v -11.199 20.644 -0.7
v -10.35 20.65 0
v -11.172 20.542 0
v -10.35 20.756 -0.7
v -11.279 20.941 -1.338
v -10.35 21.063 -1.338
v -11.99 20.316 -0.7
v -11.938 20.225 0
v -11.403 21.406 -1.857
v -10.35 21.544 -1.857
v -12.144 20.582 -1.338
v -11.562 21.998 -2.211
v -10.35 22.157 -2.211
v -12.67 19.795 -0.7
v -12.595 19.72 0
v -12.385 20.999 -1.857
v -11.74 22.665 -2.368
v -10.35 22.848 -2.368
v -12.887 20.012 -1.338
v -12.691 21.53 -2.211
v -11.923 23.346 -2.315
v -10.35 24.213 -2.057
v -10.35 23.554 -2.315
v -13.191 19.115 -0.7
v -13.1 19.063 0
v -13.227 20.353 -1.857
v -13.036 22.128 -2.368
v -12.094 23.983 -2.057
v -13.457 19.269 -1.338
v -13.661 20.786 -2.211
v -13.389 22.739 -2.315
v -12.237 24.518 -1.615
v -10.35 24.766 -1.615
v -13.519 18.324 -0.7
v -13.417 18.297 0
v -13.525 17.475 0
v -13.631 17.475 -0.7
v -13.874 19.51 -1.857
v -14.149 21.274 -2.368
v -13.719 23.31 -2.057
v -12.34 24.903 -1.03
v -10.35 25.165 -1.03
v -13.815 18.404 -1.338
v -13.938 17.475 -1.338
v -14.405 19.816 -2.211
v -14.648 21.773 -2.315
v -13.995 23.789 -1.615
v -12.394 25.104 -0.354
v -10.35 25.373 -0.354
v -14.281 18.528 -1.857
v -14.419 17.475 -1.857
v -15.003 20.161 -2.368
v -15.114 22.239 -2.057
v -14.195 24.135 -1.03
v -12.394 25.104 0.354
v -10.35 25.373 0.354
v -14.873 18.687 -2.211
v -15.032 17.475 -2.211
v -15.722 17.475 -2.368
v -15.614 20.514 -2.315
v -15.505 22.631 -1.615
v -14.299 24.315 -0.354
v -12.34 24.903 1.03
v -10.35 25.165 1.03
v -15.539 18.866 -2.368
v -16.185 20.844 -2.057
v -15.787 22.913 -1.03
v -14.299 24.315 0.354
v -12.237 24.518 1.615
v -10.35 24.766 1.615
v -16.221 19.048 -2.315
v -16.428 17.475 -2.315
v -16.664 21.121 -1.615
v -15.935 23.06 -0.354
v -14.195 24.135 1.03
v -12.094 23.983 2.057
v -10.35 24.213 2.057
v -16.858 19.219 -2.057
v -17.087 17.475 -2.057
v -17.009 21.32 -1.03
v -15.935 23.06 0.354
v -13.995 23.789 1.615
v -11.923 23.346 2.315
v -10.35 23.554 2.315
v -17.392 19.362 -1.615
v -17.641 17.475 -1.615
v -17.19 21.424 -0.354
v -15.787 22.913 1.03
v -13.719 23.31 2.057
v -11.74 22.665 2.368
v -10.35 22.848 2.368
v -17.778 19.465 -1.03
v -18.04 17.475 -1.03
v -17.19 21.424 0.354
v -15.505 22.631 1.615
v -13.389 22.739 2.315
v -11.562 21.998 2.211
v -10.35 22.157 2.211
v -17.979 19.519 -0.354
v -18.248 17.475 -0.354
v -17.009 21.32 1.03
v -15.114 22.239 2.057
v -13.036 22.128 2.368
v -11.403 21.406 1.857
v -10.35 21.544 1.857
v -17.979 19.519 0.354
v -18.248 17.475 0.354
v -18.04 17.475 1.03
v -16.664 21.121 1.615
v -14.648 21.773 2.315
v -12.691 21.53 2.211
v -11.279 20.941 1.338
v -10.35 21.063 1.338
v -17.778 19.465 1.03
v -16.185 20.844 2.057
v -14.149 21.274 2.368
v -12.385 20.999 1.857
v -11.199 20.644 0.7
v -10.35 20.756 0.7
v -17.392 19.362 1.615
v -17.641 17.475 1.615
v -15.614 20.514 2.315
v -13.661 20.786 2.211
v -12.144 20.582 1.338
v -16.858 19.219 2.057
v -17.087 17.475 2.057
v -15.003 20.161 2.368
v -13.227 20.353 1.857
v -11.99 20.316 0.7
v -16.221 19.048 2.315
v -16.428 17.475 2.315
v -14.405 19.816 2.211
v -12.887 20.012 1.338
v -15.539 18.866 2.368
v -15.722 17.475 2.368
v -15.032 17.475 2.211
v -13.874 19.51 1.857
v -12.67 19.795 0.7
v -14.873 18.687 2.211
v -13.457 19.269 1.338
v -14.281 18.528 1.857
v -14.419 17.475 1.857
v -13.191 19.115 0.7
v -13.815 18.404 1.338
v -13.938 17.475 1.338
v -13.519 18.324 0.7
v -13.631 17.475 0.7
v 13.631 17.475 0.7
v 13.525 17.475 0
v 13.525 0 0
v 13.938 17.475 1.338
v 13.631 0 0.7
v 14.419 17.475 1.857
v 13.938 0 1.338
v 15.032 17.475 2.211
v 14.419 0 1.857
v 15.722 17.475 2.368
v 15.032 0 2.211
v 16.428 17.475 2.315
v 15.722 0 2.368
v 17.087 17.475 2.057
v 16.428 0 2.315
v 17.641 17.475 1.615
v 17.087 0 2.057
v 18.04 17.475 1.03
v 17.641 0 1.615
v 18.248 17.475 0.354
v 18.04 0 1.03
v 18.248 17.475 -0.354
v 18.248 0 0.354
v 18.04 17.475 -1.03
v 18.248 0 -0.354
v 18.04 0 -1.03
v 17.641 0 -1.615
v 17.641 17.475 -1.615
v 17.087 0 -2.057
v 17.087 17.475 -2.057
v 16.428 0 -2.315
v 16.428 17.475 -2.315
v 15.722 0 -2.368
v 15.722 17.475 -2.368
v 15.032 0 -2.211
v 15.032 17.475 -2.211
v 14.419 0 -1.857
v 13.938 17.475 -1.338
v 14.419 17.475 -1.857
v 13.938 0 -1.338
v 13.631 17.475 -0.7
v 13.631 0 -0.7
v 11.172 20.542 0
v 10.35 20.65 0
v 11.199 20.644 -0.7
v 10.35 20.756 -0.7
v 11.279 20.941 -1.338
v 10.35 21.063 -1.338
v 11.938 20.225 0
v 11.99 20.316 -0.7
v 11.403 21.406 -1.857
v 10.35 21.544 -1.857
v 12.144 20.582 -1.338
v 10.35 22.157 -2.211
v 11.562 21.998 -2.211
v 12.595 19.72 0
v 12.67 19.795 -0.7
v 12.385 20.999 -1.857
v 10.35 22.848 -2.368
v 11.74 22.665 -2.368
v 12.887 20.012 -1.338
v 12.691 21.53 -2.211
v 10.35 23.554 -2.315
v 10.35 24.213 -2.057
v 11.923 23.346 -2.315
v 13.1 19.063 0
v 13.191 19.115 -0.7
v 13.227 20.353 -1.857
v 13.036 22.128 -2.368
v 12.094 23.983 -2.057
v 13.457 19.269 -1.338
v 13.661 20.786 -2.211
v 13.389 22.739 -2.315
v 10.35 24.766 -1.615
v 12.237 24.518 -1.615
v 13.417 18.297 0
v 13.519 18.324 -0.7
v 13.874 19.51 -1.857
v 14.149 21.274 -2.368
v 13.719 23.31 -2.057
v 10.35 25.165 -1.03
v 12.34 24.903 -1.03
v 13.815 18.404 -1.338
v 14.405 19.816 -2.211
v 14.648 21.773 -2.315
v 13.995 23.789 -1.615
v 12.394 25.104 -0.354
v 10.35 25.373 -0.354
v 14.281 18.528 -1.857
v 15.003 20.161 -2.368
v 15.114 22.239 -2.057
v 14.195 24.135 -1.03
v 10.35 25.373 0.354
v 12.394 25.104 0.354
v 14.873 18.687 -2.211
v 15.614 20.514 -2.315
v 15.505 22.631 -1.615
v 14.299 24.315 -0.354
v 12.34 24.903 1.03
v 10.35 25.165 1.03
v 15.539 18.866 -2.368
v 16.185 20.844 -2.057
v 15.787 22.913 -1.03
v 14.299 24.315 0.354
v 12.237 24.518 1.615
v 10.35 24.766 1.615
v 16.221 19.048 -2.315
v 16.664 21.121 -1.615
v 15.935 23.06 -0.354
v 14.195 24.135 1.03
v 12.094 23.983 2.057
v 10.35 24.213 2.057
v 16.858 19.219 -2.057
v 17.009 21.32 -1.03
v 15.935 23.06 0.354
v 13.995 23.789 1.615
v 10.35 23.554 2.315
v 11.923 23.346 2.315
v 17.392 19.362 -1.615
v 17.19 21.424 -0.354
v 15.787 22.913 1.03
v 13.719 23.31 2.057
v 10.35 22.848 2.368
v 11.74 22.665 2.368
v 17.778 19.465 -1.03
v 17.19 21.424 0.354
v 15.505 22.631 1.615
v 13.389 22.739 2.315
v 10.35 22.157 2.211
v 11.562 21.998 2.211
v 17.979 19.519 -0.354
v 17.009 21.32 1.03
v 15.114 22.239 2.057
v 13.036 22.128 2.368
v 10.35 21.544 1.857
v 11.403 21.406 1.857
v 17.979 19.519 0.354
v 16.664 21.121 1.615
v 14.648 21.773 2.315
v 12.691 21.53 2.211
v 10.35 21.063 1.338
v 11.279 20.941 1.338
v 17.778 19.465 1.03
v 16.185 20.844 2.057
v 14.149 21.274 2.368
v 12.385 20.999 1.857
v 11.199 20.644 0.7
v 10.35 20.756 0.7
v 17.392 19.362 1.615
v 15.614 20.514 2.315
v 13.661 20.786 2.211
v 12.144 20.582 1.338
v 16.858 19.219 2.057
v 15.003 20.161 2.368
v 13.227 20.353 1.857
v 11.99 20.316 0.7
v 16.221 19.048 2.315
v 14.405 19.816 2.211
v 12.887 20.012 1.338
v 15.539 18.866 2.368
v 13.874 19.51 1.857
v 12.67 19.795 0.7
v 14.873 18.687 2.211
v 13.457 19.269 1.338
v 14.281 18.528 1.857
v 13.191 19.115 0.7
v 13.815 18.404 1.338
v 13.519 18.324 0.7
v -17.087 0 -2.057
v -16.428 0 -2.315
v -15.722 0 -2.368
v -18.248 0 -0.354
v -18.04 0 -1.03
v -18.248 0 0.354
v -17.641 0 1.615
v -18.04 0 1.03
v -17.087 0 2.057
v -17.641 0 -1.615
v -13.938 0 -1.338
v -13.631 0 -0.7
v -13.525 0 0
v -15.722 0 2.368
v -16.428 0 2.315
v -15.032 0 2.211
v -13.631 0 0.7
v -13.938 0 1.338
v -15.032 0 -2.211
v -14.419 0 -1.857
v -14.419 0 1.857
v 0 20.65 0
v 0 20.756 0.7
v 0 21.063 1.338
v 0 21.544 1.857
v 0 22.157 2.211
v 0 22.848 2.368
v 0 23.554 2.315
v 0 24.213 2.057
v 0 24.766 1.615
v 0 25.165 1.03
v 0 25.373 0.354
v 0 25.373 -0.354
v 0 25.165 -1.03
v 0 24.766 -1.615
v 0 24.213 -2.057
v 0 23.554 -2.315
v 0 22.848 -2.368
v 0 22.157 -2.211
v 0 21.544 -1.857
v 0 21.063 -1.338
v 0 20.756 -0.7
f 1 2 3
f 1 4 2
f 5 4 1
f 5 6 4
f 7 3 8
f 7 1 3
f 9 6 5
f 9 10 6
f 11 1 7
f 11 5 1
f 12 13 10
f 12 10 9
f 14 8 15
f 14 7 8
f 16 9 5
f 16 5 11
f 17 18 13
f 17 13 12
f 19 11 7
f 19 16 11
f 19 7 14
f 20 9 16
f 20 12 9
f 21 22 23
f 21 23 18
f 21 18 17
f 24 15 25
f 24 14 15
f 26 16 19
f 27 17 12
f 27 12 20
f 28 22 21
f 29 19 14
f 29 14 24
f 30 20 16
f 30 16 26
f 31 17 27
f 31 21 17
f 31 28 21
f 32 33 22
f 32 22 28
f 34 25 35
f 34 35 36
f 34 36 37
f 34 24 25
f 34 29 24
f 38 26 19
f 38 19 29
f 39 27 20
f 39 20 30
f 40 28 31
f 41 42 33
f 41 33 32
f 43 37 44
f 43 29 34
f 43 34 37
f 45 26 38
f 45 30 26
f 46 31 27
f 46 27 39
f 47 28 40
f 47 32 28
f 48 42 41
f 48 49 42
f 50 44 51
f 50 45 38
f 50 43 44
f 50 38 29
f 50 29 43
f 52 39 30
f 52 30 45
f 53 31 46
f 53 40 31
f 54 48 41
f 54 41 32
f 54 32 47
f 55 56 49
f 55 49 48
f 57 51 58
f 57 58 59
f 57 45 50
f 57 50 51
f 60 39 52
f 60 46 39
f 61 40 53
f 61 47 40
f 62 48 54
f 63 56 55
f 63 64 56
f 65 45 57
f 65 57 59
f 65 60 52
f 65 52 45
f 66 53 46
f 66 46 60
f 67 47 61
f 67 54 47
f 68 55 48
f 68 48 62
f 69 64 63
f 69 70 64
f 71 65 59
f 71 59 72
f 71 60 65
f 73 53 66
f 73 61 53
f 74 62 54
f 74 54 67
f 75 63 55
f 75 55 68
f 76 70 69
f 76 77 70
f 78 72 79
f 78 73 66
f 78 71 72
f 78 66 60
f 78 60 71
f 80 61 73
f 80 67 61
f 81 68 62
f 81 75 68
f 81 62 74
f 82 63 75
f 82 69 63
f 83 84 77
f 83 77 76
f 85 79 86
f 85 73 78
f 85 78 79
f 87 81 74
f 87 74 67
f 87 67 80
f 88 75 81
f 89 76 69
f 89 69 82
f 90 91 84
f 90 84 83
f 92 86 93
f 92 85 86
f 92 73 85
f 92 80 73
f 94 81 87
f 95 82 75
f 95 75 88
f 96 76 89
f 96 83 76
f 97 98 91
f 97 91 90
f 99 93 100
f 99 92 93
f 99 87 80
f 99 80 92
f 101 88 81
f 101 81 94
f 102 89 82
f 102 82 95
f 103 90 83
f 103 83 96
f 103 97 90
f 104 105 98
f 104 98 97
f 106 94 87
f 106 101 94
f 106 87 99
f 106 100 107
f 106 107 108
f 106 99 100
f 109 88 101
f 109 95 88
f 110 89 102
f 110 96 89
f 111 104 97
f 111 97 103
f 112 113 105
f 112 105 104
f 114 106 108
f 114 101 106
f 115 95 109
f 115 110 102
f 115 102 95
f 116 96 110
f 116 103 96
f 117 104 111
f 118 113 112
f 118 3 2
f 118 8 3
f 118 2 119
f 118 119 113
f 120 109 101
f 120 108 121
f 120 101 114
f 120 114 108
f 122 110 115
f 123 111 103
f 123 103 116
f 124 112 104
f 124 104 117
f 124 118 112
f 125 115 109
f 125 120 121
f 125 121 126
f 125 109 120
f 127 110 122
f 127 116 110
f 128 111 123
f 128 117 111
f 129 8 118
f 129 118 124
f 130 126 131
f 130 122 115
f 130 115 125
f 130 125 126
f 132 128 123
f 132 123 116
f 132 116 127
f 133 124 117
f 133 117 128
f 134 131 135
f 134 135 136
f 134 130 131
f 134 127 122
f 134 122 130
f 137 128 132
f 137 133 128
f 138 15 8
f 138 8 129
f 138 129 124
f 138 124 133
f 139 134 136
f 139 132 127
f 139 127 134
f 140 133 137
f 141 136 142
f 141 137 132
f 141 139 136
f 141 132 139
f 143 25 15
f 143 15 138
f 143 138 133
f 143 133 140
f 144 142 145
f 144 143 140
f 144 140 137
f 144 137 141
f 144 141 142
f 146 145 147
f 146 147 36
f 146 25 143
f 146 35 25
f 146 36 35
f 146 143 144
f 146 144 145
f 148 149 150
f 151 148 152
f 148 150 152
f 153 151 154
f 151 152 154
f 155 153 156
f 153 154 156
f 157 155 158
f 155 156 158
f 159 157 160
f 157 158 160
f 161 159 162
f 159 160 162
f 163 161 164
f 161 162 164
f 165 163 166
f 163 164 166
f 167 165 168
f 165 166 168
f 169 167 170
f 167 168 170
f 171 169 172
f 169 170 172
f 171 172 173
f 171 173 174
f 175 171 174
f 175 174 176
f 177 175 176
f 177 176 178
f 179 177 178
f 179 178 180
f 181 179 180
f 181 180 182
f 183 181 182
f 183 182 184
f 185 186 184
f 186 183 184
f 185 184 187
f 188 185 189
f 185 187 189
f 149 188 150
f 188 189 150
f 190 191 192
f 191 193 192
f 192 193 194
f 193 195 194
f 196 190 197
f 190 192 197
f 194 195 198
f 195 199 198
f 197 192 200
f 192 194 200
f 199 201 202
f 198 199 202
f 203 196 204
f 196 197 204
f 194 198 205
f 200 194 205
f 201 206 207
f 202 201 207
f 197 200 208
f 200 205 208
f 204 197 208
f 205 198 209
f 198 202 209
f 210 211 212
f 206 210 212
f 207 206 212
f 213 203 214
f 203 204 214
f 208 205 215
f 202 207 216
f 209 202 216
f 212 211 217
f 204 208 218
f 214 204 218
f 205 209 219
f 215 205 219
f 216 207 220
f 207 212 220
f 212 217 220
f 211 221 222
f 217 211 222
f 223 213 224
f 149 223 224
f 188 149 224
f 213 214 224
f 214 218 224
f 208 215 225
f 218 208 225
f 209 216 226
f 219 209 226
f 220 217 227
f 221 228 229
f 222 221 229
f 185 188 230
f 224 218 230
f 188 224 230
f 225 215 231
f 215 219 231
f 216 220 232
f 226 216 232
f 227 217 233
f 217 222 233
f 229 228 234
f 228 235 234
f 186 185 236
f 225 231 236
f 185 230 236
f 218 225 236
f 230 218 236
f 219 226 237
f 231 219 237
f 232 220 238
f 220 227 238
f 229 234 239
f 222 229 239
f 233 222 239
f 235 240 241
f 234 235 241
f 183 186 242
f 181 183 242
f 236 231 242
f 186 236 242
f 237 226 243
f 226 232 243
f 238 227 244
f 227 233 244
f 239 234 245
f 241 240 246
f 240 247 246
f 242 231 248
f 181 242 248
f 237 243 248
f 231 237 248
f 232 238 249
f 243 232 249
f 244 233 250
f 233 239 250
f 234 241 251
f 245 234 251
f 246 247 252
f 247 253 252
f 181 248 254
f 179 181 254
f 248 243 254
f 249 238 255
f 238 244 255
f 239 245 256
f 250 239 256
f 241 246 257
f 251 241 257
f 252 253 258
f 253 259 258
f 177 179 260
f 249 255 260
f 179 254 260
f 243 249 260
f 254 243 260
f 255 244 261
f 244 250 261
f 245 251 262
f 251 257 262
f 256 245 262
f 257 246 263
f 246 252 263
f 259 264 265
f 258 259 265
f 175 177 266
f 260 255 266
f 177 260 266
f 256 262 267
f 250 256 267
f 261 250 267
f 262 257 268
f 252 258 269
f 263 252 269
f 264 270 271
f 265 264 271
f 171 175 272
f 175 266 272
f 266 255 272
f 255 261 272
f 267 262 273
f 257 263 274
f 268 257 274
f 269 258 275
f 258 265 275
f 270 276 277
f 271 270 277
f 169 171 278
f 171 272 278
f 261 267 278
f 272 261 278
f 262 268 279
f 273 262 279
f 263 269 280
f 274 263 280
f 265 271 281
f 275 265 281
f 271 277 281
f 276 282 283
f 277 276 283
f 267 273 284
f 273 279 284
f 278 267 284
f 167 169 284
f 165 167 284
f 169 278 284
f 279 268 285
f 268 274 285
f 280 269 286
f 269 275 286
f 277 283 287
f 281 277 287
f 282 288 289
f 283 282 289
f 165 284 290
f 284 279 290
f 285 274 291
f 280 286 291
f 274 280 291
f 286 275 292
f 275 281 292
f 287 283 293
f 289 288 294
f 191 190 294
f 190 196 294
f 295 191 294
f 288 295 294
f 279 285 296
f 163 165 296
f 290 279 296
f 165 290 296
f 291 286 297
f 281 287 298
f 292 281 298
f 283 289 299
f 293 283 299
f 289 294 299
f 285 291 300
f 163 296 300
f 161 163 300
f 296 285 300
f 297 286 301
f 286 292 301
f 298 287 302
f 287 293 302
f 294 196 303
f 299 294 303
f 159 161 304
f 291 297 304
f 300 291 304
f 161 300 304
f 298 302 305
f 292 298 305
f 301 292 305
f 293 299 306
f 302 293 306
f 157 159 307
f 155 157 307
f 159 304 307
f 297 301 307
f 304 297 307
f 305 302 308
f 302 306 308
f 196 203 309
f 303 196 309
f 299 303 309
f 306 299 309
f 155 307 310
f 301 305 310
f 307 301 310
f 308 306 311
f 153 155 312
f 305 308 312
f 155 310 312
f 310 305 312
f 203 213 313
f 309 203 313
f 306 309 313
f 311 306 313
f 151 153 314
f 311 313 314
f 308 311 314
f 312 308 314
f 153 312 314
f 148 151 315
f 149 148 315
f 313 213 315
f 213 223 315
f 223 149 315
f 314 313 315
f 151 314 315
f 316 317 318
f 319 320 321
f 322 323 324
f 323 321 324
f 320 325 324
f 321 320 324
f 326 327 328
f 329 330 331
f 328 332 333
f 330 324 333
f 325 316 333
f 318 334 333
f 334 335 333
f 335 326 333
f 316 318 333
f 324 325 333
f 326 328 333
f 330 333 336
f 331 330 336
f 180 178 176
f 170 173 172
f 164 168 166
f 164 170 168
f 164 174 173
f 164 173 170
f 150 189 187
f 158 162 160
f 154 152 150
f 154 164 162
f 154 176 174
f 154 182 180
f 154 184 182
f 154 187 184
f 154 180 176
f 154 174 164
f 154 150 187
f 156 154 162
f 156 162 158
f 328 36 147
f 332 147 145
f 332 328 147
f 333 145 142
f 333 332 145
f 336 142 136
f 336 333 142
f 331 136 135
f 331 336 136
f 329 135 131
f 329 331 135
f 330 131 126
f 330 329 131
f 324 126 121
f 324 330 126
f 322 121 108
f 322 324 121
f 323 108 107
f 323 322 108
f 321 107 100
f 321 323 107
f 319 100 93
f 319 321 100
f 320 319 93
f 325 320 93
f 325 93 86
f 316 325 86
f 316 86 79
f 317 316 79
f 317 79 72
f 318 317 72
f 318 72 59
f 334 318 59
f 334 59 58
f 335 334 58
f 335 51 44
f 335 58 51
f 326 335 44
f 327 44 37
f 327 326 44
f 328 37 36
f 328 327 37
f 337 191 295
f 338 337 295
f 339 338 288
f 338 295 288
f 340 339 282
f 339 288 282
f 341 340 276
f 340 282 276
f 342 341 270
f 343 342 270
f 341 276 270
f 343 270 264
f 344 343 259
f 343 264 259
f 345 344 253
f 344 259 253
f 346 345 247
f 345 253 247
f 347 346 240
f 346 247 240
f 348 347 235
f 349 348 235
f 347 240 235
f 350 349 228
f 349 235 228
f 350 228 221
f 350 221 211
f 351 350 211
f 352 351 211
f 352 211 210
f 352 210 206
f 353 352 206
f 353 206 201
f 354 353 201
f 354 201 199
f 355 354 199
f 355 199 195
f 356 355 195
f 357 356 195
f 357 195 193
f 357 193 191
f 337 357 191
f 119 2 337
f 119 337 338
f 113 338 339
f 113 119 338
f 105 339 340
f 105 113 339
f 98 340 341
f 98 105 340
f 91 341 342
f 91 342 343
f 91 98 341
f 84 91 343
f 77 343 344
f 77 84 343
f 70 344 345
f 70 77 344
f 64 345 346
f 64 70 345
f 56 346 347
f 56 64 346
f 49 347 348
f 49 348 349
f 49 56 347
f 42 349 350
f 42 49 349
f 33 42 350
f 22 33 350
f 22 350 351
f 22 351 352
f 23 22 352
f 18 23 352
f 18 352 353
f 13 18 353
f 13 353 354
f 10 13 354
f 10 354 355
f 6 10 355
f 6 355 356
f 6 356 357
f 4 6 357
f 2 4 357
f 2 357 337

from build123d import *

# Parameters (mm, degrees)
SKETCH3_R = 2.3749


with BuildPart() as part:
    # Sweep1: sweep along a path in Sketch4
    with BuildLine(Plane.XY) as sweep1_path:
        Line((0, 23.0251), (-10.35, 23.0251))
        ThreePointArc((-10.35, 23.0251), (-14.274371925, 21.399571925), (-15.8999, 17.4752))
        Line((-15.8999, 17.4752), (-15.8999, 0))
    # Sketch3 → Sweep1 (sweep)
    with BuildSketch(Plane(origin=(0, 0, 0), x_dir=(1, 0, 0), z_dir=(0, 1, 0))):
        with Locations((-15.8999, 0)):
            Circle(SKETCH3_R)
    sweep(path=sweep1_path.line)

    # Mirror1: part across plane


with BuildPart() as part_1:
    add(part.part)
    add(part.part.mirror(Plane(origin=(0, 0, 0), x_dir=(0, 0, 1), z_dir=(1, 0, 0))))


solid = part_1.part
